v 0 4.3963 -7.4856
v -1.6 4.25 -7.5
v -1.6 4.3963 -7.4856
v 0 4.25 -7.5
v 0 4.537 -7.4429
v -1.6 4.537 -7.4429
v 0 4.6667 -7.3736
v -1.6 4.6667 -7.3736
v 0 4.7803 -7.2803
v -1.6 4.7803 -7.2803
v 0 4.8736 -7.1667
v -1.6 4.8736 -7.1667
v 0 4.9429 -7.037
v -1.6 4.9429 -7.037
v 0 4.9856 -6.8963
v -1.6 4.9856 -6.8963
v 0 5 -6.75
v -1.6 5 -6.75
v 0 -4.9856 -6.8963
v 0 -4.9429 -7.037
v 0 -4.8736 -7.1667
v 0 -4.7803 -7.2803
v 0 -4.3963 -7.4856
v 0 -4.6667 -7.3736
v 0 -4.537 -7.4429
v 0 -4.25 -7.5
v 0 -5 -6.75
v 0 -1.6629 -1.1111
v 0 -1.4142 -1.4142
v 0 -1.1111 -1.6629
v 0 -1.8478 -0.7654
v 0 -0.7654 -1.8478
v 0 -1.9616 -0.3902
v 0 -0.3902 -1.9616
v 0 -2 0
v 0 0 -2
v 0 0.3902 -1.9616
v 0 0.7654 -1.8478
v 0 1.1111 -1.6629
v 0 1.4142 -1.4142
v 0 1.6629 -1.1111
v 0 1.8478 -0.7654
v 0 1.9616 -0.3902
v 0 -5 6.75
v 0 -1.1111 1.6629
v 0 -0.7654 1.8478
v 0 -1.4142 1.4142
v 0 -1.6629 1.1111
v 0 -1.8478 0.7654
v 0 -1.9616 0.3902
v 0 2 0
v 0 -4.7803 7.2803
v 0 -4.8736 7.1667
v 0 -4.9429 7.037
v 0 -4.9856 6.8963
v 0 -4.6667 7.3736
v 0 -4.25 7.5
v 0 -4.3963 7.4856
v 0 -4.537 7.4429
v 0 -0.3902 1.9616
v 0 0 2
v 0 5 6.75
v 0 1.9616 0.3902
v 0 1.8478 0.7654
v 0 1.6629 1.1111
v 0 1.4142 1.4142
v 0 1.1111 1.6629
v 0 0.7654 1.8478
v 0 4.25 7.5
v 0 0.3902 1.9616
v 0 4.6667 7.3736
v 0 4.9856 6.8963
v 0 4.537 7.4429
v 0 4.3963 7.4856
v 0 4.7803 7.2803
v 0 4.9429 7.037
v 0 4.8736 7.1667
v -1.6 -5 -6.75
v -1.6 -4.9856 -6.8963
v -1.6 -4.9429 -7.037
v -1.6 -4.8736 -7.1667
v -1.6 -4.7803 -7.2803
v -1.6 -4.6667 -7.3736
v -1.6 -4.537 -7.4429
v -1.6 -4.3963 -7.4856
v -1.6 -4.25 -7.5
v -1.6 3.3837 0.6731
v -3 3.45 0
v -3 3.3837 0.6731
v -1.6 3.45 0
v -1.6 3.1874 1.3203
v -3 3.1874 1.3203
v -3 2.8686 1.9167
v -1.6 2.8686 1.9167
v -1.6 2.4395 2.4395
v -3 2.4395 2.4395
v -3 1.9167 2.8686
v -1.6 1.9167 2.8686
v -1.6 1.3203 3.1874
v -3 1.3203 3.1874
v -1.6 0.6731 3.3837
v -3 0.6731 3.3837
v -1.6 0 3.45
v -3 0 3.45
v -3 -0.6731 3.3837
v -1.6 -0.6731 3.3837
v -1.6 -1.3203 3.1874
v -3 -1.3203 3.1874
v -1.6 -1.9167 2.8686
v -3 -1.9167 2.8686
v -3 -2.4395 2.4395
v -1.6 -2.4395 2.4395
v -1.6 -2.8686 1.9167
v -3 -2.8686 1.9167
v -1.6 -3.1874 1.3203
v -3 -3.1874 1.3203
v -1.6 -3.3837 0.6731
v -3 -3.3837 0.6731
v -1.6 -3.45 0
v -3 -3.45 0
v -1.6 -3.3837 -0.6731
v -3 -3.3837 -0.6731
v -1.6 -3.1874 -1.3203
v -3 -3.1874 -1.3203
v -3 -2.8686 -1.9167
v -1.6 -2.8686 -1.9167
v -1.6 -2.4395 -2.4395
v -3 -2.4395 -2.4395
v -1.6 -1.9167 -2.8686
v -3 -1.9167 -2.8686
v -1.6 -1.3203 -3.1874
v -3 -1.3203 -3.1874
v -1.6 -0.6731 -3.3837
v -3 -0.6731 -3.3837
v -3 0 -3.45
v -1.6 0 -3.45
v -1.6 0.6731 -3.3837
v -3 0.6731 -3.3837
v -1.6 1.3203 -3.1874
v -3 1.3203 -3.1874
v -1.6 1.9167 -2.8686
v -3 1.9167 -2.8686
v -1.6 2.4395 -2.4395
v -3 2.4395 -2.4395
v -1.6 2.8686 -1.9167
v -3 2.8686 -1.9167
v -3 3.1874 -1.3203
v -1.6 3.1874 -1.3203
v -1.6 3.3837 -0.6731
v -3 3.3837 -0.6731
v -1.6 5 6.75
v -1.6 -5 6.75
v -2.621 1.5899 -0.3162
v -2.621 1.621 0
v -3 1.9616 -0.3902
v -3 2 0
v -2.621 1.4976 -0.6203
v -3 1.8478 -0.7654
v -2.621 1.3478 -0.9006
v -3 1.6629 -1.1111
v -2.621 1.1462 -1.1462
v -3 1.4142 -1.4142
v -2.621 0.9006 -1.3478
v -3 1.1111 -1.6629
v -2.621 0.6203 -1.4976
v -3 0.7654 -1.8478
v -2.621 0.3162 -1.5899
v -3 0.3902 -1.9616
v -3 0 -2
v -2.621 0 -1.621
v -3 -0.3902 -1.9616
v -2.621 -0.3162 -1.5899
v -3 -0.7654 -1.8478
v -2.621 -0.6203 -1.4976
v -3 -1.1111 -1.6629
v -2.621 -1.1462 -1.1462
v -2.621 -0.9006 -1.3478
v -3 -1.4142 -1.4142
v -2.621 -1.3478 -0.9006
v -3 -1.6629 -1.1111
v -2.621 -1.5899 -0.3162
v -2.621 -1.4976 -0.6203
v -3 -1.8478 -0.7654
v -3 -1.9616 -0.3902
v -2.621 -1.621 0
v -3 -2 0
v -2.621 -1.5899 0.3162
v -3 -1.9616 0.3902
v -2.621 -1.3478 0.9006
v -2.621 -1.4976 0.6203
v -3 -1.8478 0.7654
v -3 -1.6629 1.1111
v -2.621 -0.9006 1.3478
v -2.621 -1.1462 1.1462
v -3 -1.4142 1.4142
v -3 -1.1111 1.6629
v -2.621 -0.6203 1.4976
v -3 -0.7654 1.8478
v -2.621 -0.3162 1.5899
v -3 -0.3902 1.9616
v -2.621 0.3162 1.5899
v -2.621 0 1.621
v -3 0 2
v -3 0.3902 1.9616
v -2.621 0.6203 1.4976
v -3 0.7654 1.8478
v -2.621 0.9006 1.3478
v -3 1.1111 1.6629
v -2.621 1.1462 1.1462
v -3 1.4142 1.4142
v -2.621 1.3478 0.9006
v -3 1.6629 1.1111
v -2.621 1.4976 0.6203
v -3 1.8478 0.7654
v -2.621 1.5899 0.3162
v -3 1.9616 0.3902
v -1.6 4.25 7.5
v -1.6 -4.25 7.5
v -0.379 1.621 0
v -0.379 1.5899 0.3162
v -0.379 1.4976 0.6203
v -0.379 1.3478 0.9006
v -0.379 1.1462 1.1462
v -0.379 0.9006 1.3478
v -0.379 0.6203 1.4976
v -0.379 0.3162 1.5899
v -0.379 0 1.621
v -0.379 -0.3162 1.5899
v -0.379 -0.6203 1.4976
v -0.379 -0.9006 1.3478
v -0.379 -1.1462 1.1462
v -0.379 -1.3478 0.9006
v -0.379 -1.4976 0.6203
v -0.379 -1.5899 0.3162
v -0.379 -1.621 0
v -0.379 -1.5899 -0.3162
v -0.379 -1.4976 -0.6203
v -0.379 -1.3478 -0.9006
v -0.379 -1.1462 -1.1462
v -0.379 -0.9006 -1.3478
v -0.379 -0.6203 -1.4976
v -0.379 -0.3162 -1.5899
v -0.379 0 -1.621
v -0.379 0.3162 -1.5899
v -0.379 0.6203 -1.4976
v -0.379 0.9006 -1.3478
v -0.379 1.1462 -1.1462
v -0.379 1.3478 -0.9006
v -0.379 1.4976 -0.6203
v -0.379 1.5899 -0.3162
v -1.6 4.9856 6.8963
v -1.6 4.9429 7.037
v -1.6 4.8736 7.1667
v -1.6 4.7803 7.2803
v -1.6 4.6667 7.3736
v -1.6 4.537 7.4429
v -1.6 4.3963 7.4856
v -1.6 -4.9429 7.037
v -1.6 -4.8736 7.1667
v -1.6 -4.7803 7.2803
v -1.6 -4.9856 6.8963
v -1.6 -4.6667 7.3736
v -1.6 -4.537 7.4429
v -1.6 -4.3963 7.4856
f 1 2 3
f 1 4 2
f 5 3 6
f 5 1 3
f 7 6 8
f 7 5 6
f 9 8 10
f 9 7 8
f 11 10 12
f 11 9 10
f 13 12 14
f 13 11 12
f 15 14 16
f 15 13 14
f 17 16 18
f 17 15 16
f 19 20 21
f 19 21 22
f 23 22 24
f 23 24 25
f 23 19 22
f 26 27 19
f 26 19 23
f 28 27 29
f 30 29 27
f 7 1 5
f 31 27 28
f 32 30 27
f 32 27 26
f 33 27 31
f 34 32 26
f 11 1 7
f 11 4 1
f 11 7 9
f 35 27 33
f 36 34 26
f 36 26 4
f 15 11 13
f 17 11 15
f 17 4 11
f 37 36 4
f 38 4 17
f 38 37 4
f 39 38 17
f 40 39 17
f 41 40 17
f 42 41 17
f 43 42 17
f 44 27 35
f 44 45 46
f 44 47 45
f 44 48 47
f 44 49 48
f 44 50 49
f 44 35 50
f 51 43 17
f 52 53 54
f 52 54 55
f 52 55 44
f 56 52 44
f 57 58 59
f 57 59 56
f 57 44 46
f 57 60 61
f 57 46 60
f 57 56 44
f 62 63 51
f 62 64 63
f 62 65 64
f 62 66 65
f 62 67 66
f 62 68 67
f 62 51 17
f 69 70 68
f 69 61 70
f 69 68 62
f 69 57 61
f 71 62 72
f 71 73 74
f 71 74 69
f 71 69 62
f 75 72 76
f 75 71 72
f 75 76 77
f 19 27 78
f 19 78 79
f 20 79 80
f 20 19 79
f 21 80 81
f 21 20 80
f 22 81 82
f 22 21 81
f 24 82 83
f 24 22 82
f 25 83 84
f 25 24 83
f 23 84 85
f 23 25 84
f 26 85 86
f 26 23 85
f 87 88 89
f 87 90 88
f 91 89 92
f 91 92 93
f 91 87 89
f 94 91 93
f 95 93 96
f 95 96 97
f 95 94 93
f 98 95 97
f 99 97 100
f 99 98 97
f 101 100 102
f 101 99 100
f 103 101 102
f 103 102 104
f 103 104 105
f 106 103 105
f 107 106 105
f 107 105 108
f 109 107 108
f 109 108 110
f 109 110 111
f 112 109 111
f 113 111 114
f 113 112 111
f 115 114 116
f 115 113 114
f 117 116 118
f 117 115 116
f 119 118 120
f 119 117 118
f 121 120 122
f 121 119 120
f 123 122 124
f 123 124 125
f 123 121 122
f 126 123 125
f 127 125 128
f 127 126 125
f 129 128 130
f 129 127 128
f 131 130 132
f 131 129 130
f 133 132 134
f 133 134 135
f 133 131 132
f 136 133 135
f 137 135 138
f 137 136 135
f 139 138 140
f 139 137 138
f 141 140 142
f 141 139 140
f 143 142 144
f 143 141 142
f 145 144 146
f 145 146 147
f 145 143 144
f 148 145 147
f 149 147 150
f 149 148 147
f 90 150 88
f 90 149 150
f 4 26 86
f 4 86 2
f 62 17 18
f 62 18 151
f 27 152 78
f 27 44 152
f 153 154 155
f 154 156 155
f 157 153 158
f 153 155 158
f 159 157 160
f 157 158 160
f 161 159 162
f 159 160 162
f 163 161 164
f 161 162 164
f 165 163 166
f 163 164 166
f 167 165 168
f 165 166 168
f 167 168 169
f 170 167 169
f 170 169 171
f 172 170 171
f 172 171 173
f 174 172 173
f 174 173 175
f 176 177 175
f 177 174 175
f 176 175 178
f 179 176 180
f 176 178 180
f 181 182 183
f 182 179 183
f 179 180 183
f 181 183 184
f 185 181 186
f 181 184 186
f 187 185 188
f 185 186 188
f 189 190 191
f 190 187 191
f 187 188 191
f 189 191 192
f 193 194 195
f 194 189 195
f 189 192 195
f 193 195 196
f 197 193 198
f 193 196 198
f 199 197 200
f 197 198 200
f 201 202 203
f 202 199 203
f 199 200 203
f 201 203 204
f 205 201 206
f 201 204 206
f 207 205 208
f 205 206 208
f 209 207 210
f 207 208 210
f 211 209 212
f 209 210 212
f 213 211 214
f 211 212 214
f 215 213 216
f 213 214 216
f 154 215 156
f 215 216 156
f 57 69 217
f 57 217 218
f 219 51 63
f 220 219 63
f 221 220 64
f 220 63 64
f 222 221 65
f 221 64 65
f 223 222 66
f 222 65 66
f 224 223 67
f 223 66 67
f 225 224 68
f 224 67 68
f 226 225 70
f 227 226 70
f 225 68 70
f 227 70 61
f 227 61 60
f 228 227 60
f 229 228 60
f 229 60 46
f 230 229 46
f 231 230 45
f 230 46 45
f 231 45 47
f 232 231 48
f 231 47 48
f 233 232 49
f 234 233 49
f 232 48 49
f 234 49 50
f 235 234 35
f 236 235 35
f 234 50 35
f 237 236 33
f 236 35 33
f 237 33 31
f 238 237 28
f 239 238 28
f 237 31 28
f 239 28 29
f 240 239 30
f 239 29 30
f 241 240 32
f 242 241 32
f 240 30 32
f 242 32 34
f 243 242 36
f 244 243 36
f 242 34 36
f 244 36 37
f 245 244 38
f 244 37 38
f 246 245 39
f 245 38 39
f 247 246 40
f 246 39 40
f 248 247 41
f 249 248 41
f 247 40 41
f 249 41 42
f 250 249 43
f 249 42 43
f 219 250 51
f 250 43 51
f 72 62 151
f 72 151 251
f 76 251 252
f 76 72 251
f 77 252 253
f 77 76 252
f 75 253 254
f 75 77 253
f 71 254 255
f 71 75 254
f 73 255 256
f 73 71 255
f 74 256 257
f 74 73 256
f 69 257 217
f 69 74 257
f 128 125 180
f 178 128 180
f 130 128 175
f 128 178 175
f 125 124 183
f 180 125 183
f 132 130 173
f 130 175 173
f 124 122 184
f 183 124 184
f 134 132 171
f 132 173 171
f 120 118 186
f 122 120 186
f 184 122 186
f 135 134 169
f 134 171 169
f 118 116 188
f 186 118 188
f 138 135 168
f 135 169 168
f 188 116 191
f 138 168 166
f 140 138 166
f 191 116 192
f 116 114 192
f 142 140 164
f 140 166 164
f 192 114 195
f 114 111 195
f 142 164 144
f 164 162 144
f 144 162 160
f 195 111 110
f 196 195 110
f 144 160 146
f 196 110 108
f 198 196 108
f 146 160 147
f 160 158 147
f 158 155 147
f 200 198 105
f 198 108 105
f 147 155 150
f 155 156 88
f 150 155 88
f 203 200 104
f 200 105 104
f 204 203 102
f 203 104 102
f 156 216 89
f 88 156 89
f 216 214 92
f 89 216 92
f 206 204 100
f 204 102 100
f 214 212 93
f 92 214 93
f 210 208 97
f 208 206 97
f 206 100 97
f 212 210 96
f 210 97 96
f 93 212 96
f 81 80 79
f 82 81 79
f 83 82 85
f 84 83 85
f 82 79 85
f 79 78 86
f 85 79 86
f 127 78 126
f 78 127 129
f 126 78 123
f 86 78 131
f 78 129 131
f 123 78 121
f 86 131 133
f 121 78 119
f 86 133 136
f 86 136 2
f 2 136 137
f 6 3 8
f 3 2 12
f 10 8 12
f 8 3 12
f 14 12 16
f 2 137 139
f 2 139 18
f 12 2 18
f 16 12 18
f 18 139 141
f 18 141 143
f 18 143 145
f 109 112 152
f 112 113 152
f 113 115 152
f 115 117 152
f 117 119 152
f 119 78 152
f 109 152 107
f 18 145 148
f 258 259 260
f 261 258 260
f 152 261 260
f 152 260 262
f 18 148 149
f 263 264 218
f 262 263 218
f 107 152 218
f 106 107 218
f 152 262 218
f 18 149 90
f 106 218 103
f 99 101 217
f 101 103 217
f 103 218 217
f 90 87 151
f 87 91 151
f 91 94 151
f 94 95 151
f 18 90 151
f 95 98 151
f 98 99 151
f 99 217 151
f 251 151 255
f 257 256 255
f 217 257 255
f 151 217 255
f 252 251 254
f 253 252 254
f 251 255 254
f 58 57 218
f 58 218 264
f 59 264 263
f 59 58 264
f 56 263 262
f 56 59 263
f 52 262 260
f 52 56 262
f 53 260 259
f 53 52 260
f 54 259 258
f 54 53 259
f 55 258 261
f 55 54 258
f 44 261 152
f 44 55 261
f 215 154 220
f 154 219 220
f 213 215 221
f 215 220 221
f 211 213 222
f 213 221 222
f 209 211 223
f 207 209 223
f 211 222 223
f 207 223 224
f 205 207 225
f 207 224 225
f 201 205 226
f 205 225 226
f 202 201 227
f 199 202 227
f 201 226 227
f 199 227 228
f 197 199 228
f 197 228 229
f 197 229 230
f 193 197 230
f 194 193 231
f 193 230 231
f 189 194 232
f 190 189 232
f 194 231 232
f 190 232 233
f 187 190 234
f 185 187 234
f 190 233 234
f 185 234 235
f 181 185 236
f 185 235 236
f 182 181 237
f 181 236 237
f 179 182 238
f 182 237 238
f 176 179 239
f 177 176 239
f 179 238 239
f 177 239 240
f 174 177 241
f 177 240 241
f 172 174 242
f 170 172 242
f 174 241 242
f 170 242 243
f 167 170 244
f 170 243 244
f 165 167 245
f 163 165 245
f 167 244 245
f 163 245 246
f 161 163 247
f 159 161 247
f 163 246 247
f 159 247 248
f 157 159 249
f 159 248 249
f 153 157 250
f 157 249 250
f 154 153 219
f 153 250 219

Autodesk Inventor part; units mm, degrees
sketch "Sketch_1" plane through (0, 0, 0) normal (1, 0, 0) x (0, 1, 0)
  line L0 (4.25, 7.5) -> (-4.25, 7.5)
  arc A0 (-4.25, 7.5) -> (-5, 6.75) centre (-4.25, 6.75) ccw
  line L1 (-5, 6.75) -> (-5, -6.75)
  arc A1 (-5, -6.75) -> (-4.25, -7.5) centre (-4.25, -6.75) ccw
  line L2 (-4.25, -7.5) -> (4.25, -7.5)
  arc A2 (4.25, -7.5) -> (5, -6.75) centre (4.25, -6.75) ccw
  line L3 (5, -6.75) -> (5, 6.75)
  arc A3 (5, 6.75) -> (4.25, 7.5) centre (4.25, 6.75) ccw
extrude "Extrusion1" add sketch "Sketch_1" against normal blind 3
sketch "Sketch_2" plane through (0, 0, 0) normal (0, 0, 1) x (1, 0, 0)
  line L0 (3, 0) -> (-3, 0)
  line L1 (-4.6, 3.45) -> (-1.6, 3.45)
  line L2 (-1.6, 3.45) -> (-1.6, 13.45)
  line L3 (-1.6, 13.45) -> (-4.6, 13.45)
  line L4 (-4.6, 13.45) -> (-4.6, 3.45)
revolve "Revolution1" cut sketch "Sketch_2" angle 360 about axis through (3, 0, 0) along (1, 0, 0)
sketch "Sketch_3" plane through (0, 0, 0) normal (0, 0, 1) x (1, 0, 0)
  line L0 (0, 0) -> (-3, 0)
  line L1 (-3, 0) -> (-3, 2)
  line L2 (-3, 2) -> (-2.621, 1.621)
  line L3 (-2.621, 1.621) -> (-0.379, 1.621)
  line L4 (-0.379, 1.621) -> (0, 2)
  line L5 (0, 2) -> (0, 0)
  line L6 (0, 0) -> (-3, 0)
revolve "Revolution2" cut sketch "Sketch_3" angle 360 about axis through (0, 0, 0) along (1, 0, 0)
thread "Thread1" size "M4x0.7" class "6H" standard "ISO Metric profile" full length
ref_plane "dummy_XY" through (0, 0, 0) normal (1, 0, 0) x (0, 0, -1)
ref_plane "dummy_YZ" through (0, 0, 0) normal (0, 0, -1) x (0, 1, 0)
ref_plane "dummy_ZX" through (0, 0, 0) normal (0, 1, 0) x (1, 0, 0)
properties part number "HNKK5-4" material "Steel, Alloy"
